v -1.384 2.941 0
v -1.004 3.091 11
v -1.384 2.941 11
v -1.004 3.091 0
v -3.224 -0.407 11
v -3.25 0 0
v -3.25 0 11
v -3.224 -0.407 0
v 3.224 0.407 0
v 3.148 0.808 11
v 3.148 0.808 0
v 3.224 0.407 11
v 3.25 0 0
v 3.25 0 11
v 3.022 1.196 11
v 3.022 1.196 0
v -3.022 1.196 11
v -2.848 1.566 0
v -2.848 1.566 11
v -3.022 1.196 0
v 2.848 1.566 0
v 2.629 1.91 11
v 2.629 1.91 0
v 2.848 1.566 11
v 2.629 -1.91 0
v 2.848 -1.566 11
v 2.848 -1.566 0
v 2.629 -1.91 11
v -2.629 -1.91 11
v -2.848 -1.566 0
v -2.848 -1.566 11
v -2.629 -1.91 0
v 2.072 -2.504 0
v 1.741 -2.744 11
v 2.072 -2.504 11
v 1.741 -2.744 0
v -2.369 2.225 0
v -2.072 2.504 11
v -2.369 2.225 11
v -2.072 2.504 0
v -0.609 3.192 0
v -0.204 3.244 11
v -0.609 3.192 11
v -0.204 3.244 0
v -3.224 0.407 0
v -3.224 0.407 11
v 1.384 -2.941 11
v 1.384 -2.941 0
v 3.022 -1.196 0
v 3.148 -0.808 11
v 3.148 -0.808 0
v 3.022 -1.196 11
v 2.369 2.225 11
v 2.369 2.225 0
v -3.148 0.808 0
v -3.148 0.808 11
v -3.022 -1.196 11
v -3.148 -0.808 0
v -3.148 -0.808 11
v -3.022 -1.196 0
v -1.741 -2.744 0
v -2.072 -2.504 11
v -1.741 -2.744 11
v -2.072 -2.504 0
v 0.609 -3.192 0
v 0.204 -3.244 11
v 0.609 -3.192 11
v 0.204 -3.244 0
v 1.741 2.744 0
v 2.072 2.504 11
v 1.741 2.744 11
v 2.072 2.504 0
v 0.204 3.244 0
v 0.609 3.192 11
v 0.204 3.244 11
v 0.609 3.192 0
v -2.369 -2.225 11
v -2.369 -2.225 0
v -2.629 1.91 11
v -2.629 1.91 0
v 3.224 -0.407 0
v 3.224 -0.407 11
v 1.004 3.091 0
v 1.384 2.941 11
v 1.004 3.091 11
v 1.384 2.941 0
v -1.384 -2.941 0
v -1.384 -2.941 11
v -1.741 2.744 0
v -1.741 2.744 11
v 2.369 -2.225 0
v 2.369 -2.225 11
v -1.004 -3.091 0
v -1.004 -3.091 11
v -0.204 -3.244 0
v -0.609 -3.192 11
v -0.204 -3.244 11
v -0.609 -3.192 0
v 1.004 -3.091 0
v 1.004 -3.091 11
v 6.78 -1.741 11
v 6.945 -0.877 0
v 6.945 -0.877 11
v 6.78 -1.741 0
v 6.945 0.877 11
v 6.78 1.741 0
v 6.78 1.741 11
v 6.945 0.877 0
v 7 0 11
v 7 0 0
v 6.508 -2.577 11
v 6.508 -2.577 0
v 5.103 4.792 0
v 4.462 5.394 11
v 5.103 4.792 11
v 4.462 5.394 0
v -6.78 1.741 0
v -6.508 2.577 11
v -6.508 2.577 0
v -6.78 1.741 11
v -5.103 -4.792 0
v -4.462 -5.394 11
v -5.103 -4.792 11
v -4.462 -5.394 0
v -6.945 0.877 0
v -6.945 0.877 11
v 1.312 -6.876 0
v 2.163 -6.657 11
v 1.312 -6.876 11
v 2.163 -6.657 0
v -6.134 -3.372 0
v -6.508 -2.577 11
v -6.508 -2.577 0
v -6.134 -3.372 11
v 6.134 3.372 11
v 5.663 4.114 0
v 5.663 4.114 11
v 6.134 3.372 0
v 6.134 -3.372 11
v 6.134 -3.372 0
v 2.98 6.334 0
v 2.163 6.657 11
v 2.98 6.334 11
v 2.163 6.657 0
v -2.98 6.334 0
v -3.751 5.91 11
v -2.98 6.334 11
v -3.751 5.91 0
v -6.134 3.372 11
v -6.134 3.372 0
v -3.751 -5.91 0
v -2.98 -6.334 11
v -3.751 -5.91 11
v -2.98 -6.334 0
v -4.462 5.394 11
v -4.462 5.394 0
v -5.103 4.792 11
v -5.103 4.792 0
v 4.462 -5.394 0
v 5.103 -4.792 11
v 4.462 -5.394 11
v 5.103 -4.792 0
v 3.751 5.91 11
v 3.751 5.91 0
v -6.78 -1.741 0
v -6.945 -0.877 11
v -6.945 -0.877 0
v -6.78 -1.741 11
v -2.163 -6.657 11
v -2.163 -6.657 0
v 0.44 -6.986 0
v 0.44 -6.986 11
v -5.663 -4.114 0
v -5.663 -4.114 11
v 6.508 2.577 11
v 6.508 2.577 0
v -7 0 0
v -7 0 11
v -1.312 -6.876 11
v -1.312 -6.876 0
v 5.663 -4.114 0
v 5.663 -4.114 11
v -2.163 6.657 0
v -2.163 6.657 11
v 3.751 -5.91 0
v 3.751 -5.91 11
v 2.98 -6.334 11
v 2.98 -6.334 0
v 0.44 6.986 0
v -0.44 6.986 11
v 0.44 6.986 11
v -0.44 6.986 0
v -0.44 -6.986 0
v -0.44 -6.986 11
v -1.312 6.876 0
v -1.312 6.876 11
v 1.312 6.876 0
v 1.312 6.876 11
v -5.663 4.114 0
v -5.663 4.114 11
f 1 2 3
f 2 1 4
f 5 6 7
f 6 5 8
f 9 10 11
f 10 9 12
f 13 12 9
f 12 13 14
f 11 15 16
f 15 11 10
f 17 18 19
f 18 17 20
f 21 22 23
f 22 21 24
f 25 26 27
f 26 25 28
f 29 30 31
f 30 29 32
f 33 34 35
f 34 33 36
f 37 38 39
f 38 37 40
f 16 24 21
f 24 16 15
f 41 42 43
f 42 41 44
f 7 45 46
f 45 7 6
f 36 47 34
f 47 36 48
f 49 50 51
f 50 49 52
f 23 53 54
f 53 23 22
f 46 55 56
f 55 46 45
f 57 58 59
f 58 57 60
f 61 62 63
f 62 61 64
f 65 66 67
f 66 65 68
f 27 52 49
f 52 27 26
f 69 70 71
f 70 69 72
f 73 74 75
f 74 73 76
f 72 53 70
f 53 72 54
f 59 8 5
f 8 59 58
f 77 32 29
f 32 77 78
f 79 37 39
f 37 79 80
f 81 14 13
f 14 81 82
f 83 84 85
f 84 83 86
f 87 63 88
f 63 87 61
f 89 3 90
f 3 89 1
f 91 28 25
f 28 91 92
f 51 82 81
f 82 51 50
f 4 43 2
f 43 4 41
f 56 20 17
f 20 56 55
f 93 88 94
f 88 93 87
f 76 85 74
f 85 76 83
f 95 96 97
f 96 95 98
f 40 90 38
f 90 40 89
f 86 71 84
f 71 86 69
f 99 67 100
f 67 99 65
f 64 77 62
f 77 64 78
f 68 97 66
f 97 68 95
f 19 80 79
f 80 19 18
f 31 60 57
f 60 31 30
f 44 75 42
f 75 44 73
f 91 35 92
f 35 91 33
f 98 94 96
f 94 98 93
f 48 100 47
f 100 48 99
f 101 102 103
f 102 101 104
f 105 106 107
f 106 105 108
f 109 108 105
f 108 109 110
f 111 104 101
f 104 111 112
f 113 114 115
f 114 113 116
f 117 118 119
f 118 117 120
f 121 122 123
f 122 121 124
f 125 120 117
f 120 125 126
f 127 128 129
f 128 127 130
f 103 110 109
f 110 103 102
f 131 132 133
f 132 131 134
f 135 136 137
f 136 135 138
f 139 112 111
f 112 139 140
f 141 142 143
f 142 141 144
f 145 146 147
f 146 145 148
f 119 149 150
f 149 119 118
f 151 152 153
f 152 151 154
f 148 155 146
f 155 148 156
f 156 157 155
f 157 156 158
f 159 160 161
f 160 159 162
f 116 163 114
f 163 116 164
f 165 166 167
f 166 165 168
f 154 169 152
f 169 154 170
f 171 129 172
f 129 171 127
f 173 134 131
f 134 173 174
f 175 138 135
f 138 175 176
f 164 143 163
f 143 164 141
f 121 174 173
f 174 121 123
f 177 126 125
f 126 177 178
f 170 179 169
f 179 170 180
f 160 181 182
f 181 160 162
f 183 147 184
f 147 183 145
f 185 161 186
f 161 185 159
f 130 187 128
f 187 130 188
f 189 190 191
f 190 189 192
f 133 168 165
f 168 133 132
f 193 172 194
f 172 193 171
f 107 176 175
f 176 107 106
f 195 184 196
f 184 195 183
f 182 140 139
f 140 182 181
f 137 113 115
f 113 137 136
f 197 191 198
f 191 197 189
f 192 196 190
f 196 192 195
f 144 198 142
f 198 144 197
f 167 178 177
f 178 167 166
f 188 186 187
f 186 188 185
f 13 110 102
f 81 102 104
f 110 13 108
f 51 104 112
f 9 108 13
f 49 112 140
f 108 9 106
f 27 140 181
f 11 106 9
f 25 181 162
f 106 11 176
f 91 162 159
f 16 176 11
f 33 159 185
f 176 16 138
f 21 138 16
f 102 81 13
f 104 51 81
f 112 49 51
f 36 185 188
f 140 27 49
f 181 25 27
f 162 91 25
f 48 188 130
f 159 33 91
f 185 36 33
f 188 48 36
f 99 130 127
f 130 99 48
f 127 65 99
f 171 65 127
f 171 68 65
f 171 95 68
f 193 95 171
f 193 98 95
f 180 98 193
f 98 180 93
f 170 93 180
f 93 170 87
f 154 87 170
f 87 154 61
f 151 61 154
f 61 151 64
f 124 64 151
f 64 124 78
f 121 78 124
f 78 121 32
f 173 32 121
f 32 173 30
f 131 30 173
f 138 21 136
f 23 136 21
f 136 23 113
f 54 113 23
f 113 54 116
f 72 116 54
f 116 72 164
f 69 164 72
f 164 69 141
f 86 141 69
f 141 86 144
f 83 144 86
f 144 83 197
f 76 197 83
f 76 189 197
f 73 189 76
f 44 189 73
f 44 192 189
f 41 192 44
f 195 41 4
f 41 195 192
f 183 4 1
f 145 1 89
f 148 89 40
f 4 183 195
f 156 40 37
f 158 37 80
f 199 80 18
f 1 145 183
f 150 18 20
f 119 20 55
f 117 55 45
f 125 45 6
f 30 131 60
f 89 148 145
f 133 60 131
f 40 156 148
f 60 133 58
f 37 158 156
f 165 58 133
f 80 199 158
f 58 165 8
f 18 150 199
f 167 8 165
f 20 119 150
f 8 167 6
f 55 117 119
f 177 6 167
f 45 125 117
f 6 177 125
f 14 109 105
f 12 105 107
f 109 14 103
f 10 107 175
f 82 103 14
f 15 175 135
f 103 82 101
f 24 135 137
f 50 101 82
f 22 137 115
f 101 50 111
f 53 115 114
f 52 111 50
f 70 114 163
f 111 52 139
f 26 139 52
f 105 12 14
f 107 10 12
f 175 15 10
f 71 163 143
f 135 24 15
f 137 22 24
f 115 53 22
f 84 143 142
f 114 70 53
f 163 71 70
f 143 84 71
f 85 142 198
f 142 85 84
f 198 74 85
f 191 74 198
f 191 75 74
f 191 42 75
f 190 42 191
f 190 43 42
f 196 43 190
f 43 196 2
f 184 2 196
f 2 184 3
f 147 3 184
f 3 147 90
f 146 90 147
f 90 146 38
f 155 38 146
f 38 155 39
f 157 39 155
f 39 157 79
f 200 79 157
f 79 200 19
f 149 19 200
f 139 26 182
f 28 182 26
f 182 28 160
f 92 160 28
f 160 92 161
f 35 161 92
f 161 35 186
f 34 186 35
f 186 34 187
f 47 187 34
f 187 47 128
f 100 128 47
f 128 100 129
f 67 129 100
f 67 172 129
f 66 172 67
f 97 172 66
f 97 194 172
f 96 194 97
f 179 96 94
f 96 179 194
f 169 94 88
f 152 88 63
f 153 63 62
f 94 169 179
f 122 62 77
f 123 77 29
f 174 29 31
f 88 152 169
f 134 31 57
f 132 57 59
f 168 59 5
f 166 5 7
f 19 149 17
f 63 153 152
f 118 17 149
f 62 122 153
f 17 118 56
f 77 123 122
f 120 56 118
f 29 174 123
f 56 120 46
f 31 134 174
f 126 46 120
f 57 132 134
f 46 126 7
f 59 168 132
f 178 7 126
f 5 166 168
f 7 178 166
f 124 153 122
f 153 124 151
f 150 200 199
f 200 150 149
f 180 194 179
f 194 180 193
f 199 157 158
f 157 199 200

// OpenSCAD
$fn = 50;


difference() {
	union() {
		cylinder(h = 11, r = 7.0000000000);
	}
	union() {
		translate(v = [0.0000000000, 0.0000000000, -100.0000000000]) {
			cylinder(h = 200, r = 3.2500000000);
		}
		cylinder(h = 11, r = 1.8000000000);
		cylinder(h = 11, r = 1.8000000000);
		cylinder(h = 11, r = 1.8000000000);
	}
}
